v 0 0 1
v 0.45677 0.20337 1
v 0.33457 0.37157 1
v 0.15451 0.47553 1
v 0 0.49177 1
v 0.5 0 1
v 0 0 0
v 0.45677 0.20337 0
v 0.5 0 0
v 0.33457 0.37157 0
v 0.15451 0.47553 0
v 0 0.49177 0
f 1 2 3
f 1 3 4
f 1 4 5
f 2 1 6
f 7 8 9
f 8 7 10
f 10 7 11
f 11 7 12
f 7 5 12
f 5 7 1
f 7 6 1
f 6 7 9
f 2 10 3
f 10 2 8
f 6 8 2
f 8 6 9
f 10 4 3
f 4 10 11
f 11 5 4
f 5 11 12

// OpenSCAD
$fn=15;
intersection(){
	cube([1,1,1]);
	cylinder(r=0.5,h=1);
}
